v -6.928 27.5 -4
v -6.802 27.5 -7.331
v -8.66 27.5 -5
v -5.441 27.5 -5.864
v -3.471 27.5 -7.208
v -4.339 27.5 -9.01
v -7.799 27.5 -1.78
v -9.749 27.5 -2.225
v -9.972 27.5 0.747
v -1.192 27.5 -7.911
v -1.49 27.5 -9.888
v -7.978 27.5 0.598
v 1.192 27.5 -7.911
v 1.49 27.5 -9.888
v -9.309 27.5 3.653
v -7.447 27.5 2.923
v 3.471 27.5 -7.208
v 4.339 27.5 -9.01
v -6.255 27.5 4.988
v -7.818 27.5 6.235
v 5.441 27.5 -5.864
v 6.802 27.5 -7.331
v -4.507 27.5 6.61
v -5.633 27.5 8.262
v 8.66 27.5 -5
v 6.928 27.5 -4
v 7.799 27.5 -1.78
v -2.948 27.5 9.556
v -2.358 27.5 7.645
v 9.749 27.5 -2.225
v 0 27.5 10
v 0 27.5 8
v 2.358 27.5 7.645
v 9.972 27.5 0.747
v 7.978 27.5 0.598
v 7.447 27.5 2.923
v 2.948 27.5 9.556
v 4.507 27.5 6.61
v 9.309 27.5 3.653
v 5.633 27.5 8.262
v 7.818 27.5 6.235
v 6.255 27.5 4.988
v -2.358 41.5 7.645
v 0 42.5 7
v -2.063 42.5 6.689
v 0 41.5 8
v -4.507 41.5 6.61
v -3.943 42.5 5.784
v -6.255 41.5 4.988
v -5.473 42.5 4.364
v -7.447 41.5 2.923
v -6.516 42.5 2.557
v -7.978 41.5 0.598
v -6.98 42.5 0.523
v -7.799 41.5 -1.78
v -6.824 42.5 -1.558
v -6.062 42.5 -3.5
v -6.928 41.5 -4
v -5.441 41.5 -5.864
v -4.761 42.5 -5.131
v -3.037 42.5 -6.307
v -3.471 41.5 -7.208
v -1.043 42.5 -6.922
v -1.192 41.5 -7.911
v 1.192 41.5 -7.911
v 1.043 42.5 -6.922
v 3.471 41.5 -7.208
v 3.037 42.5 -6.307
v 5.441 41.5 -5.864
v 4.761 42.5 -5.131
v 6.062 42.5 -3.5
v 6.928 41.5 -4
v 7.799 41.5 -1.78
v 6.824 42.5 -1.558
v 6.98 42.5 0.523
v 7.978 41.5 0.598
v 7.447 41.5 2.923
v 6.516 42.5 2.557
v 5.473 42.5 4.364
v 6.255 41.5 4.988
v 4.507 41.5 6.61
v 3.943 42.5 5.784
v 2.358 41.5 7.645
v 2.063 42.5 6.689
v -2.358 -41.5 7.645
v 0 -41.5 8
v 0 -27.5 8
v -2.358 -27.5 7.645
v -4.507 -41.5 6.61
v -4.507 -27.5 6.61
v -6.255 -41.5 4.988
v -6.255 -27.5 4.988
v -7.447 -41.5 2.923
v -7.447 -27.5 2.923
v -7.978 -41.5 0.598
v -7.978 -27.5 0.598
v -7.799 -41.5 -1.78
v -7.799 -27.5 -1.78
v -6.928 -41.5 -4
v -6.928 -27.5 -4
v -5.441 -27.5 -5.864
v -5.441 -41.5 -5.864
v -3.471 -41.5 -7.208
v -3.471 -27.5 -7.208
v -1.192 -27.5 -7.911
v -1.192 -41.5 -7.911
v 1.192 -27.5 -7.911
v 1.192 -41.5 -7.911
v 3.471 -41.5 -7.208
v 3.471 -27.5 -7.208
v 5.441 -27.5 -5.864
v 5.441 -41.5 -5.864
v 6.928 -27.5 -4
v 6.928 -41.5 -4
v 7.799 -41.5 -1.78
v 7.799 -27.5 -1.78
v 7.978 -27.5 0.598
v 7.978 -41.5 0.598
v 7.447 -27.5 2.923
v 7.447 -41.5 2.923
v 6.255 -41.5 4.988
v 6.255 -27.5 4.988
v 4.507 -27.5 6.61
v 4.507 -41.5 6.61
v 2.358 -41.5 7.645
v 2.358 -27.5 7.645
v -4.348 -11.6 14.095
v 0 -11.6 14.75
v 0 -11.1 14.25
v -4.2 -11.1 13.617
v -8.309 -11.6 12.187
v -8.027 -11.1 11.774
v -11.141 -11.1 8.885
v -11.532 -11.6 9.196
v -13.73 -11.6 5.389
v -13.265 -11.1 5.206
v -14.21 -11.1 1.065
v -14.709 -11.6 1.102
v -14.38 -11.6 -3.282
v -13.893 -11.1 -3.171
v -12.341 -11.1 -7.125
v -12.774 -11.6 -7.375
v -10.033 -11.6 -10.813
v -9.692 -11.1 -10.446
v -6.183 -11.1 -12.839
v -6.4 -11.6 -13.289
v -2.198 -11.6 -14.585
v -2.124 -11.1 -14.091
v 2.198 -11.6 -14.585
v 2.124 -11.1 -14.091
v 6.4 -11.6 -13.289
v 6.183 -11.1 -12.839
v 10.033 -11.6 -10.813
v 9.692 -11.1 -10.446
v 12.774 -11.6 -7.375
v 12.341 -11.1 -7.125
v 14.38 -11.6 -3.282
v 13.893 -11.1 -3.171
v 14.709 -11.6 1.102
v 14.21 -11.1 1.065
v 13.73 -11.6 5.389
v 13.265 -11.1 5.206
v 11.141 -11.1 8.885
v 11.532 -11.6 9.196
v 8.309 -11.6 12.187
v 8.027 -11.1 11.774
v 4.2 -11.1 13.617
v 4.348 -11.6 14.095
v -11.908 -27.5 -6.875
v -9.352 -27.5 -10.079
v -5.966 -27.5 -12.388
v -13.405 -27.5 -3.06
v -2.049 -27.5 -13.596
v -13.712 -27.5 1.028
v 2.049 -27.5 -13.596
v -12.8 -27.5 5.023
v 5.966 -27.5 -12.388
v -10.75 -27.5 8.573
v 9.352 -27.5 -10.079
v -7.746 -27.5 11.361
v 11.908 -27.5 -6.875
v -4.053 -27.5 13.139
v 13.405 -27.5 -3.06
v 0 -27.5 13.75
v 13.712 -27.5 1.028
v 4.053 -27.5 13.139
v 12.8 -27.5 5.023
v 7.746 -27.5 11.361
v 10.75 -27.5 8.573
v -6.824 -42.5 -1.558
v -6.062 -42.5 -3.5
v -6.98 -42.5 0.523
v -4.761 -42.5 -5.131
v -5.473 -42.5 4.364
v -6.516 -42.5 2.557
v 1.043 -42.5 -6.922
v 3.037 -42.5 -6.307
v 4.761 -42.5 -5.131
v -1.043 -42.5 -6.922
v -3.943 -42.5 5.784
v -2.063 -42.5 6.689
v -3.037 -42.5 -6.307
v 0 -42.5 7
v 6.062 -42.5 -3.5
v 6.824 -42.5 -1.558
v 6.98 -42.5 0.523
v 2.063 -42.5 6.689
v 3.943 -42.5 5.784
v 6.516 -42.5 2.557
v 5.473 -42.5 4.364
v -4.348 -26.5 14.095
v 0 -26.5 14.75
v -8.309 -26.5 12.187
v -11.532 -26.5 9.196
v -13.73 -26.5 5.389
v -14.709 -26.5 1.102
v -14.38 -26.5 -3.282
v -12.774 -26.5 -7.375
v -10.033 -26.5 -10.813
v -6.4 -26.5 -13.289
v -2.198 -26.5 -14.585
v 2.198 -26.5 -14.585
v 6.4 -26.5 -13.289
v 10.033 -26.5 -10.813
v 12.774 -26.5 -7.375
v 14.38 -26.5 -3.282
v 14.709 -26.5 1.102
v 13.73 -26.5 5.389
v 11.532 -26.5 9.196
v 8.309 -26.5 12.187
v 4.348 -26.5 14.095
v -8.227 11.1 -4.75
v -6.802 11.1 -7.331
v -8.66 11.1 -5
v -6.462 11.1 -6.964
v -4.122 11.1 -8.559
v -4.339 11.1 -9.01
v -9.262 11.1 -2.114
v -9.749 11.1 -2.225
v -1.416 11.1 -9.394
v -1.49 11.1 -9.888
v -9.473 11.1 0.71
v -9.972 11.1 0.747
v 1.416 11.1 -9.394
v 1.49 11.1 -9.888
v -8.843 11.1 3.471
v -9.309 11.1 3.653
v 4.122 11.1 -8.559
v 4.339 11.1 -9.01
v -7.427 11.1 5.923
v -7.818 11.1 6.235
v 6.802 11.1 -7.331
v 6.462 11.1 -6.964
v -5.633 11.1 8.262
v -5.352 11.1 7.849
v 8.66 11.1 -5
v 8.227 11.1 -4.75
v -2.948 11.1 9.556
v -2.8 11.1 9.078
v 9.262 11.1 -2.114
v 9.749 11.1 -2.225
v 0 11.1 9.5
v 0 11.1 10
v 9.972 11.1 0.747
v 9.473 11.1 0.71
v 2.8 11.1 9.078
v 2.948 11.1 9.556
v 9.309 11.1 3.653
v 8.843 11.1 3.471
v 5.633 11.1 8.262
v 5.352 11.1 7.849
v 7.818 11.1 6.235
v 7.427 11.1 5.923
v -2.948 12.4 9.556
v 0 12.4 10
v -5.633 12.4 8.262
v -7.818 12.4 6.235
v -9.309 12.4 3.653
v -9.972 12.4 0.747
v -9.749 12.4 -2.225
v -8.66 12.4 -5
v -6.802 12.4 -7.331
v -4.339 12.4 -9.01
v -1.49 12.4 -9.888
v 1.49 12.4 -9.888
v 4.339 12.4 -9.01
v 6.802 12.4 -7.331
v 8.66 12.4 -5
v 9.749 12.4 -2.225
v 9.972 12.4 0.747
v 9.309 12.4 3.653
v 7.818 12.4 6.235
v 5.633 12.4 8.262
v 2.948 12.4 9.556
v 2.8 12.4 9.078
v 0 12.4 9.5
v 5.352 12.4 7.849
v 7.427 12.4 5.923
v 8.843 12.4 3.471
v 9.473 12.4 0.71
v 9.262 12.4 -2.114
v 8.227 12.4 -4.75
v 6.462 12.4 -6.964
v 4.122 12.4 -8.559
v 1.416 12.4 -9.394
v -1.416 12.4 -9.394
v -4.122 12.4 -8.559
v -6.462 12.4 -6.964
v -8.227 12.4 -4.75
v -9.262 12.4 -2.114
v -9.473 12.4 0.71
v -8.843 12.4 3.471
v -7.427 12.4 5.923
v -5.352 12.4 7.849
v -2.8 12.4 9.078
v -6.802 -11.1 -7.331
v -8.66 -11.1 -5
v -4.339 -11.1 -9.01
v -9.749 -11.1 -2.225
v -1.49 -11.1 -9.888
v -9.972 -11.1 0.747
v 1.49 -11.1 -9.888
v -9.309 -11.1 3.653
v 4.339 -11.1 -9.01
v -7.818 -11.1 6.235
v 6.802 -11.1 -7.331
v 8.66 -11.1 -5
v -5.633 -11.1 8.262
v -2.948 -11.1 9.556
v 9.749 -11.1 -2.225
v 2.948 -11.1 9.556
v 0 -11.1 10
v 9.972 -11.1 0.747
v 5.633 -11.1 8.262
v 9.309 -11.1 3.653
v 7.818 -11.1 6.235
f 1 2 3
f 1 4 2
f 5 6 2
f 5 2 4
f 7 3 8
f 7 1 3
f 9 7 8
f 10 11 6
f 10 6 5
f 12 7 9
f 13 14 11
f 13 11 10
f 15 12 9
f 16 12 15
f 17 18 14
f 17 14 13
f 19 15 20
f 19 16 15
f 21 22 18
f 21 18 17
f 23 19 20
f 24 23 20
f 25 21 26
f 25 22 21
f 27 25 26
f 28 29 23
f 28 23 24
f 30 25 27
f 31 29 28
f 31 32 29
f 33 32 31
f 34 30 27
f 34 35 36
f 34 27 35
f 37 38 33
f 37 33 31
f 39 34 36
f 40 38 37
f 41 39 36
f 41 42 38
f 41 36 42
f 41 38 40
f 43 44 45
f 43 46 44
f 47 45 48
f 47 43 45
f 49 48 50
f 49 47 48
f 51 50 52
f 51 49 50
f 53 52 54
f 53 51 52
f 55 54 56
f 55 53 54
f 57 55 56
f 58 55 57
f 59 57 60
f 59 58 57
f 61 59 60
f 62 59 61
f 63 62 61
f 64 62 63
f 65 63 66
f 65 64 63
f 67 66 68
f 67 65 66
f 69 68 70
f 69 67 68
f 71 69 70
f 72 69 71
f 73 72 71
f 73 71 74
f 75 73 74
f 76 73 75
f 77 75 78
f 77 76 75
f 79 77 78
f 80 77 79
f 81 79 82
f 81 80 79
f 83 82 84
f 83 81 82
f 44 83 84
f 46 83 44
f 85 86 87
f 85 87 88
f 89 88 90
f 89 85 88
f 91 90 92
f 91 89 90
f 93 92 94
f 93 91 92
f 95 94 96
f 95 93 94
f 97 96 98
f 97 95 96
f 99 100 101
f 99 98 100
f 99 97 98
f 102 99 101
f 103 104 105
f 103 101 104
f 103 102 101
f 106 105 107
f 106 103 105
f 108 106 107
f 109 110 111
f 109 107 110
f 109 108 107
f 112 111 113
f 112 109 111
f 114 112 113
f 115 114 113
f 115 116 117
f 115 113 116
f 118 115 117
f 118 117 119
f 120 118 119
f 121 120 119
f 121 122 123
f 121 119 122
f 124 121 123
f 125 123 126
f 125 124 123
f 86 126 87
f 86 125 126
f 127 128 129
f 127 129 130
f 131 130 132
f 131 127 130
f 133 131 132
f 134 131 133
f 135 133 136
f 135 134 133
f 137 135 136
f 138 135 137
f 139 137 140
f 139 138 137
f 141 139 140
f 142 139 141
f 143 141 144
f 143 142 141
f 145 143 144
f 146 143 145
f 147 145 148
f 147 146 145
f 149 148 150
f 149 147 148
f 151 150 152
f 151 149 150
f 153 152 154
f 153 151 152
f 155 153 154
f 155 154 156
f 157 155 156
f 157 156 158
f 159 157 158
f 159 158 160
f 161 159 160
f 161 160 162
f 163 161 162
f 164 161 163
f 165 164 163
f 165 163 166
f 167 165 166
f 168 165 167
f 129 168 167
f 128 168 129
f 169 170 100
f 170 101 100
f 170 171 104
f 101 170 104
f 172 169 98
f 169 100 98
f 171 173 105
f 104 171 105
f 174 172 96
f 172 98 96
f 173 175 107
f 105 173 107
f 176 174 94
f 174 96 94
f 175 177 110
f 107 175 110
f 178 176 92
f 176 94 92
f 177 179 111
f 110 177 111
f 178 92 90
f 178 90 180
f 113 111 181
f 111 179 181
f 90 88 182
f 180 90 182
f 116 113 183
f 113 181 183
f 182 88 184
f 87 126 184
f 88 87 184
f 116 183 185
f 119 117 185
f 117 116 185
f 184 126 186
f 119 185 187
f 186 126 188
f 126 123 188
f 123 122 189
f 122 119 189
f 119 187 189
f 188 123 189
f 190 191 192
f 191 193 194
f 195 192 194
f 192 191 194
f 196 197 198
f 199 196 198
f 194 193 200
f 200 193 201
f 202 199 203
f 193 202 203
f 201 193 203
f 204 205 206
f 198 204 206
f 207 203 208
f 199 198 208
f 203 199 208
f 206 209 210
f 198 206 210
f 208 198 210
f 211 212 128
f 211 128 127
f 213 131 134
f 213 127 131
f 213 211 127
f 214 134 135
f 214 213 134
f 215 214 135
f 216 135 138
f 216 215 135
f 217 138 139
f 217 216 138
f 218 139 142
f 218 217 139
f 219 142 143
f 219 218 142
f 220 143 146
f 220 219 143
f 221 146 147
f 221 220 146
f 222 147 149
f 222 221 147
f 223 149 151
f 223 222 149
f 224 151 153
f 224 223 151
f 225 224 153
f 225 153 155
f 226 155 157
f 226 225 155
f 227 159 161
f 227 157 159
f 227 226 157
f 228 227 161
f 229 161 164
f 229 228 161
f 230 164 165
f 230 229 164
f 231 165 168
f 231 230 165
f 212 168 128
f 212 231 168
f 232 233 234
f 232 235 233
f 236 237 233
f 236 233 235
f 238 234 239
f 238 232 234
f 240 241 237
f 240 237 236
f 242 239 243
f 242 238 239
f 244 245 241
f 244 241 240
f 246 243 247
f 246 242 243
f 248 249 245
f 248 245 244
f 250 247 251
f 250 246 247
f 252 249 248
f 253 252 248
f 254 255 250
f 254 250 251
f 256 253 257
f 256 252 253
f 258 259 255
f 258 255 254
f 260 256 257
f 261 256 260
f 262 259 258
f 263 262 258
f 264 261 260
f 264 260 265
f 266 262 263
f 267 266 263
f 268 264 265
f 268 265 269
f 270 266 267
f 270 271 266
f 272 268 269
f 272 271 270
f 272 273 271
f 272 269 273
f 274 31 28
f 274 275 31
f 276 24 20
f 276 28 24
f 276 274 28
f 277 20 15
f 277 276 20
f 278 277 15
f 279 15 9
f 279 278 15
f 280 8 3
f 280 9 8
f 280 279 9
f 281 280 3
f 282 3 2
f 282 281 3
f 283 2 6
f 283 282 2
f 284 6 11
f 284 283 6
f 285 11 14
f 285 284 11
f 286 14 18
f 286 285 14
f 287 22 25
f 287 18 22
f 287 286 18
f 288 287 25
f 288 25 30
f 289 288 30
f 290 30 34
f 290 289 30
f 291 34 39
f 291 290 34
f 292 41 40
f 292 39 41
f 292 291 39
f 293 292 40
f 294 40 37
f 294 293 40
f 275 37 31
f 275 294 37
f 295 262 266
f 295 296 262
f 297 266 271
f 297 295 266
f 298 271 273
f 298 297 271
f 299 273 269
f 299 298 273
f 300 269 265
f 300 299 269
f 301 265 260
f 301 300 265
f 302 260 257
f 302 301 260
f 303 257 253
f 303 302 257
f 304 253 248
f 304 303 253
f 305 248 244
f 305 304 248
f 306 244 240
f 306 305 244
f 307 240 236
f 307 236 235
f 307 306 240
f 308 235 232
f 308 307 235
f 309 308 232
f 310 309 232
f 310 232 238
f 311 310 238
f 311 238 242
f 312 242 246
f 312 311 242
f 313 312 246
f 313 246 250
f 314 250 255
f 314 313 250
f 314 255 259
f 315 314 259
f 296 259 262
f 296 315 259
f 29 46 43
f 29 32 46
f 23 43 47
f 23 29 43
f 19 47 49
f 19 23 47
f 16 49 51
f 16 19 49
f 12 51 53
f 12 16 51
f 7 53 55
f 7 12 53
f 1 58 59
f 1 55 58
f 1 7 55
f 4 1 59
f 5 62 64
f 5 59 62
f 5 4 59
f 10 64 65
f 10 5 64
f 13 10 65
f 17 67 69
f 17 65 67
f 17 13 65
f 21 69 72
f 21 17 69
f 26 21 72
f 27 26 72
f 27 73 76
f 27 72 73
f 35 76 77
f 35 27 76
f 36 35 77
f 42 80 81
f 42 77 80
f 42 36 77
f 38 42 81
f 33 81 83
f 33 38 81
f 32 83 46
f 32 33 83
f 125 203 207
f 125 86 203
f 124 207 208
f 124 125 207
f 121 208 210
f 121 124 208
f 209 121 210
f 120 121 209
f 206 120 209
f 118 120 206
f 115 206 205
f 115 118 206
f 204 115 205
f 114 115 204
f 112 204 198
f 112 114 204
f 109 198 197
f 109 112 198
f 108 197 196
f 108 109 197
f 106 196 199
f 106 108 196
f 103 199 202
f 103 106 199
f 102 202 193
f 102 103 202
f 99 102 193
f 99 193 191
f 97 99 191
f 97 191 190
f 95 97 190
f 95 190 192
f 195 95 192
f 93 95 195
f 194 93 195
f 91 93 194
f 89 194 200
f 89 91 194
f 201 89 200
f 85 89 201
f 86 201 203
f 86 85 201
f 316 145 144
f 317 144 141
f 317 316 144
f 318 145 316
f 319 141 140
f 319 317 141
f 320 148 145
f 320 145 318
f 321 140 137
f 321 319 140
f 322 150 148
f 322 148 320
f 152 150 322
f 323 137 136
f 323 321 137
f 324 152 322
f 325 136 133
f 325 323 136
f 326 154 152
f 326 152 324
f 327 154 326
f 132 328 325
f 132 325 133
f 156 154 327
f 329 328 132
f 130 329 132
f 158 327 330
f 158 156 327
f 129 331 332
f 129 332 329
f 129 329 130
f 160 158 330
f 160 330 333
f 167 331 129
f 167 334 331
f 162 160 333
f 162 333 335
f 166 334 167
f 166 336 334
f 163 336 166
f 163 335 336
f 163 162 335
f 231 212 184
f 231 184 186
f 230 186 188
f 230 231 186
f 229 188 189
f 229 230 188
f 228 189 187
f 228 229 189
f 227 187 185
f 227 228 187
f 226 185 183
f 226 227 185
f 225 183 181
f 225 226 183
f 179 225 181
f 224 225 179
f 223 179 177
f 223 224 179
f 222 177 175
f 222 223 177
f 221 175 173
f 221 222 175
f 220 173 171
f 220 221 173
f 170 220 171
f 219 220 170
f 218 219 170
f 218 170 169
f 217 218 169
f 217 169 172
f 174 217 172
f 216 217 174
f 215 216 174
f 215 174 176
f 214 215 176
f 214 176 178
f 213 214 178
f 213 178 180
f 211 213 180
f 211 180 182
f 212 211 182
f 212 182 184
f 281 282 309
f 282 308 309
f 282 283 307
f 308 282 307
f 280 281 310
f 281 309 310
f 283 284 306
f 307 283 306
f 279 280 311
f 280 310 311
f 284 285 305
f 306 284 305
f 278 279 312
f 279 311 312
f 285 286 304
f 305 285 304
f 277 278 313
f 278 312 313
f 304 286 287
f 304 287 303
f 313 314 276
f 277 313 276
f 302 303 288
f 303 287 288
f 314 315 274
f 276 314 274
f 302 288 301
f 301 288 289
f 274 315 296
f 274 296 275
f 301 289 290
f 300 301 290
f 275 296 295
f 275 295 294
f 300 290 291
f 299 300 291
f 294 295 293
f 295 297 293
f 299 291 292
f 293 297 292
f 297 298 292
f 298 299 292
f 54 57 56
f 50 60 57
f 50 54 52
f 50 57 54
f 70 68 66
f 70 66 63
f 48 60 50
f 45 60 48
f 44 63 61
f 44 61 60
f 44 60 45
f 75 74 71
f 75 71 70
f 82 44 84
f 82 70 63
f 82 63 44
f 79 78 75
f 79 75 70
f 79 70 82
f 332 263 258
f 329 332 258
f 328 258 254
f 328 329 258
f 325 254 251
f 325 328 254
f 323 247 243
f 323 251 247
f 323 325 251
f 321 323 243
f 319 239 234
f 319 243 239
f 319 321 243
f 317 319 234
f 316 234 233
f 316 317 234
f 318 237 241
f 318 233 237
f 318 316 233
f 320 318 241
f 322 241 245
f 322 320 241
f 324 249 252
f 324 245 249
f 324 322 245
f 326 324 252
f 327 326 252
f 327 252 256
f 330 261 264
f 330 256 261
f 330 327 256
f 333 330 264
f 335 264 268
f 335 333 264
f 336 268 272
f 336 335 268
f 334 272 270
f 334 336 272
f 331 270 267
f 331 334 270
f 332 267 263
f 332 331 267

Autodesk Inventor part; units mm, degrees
ref_plane "YZ Plane" through (0, 0, 0) normal (1, 0, 0) x (0, 1, 0)
ref_plane "XZ Plane" through (0, 0, 0) normal (0, 1, 0) x (-1, 0, 0)
ref_plane "XY Plane" through (0, 0, 0) normal (0, 0, 1) x (1, 0, 0)
sketch "Skizze1" plane through (0, 0, 0) normal (1, 0, 0) x (0, 1, 0)
  line L0 (0, 17.7) -> (0, -2.95) construction
  line L1 (-59.5, 0) -> (59.5, 0) projected
  line L2 (42.5, 8) -> (42.5, 0)
  line L3 (42.5, 8) -> (27.5, 8)
  line L4 (27.5, 8) -> (27.5, 10)
  line L5 (27.5, 10) -> (-11.1, 10)
  line L6 (-11.1, 10) -> (-11.1, 14.75)
  line L7 (-11.1, 14.75) -> (-27.5, 14.75)
  line L8 (-27.5, 14.75) -> (-27.5, 8)
  line L9 (-27.5, 8) -> (-42.5, 8)
  line L10 (-42.5, 8) -> (-42.5, 0)
  line L11 (-11.1, 14.75) -> (11.1, 14.75) construction
  line L12 (11.1, 14.75) -> (11.1, 10) construction
  line L13 (-42.5, 0) -> (42.5, 0)
  point P0 (0, 0)
  dimension "d0" = 16
  dimension "d1" = 15
  dimension "d2" = 22.2
  dimension "d3" = 55
  dimension "d4" = 20
  dimension "d5" = 29.5
revolve "Grundkörper" add sketch "Skizze1" angle 360 about axis through (0, 0, 0) along (0, 1, 0)
sketch "Skizze2" plane through (0, 0, 0) normal (1, 0, 0) x (0, 1, 0)
  line L0 (-9.1, 0) -> (33.6, 0) construction
  line L1 (-11.1, -14.75) -> (-11.1, 14.75) construction
  line L2 (-11.1, 10) -> (27.5, 10) projected
  line L3 (-11.1, 10) -> (-11.1, 14.75)
  line L4 (-11.1, 14.75) -> (11.1, 14.75)
  line L5 (11.1, 14.75) -> (11.1, 10)
  line L6 (11.1, 10) -> (-11.1, 10)
  line L7 (0, 20.65) -> (0, -20.65) construction
  line L8 (11.1, 10) -> (11.1, 9.5)
  line L9 (11.1, 9.5) -> (12.4, 9.5)
  line L10 (12.4, 9.5) -> (12.4, 10)
  line L11 (11.1, 10) -> (12.4, 10)
  point P0 (0, 0)
  dimension "d15" = 1.3
  dimension "d16" = 19
revolve "Nut_Sicherungsring_DIN471-20x1,2" cut sketch "Skizze2" angle 360 about axis through (0, 0, 0) along (0, 1, 0) contours L2 L10 L9 L8
chamfer "FaseAllgemein" distance 1 angle 45 3 edges at (0, -42.5, -8) (0, 42.5, -8) (0, -27.5, -14.75)
chamfer "FaseLager" distance 0.5 angle 45 1 edges at (0, -11.1, -14.75)
properties part number "200-40-BOGIE-CONNECTOR-05" material "Aluminium 6061"
